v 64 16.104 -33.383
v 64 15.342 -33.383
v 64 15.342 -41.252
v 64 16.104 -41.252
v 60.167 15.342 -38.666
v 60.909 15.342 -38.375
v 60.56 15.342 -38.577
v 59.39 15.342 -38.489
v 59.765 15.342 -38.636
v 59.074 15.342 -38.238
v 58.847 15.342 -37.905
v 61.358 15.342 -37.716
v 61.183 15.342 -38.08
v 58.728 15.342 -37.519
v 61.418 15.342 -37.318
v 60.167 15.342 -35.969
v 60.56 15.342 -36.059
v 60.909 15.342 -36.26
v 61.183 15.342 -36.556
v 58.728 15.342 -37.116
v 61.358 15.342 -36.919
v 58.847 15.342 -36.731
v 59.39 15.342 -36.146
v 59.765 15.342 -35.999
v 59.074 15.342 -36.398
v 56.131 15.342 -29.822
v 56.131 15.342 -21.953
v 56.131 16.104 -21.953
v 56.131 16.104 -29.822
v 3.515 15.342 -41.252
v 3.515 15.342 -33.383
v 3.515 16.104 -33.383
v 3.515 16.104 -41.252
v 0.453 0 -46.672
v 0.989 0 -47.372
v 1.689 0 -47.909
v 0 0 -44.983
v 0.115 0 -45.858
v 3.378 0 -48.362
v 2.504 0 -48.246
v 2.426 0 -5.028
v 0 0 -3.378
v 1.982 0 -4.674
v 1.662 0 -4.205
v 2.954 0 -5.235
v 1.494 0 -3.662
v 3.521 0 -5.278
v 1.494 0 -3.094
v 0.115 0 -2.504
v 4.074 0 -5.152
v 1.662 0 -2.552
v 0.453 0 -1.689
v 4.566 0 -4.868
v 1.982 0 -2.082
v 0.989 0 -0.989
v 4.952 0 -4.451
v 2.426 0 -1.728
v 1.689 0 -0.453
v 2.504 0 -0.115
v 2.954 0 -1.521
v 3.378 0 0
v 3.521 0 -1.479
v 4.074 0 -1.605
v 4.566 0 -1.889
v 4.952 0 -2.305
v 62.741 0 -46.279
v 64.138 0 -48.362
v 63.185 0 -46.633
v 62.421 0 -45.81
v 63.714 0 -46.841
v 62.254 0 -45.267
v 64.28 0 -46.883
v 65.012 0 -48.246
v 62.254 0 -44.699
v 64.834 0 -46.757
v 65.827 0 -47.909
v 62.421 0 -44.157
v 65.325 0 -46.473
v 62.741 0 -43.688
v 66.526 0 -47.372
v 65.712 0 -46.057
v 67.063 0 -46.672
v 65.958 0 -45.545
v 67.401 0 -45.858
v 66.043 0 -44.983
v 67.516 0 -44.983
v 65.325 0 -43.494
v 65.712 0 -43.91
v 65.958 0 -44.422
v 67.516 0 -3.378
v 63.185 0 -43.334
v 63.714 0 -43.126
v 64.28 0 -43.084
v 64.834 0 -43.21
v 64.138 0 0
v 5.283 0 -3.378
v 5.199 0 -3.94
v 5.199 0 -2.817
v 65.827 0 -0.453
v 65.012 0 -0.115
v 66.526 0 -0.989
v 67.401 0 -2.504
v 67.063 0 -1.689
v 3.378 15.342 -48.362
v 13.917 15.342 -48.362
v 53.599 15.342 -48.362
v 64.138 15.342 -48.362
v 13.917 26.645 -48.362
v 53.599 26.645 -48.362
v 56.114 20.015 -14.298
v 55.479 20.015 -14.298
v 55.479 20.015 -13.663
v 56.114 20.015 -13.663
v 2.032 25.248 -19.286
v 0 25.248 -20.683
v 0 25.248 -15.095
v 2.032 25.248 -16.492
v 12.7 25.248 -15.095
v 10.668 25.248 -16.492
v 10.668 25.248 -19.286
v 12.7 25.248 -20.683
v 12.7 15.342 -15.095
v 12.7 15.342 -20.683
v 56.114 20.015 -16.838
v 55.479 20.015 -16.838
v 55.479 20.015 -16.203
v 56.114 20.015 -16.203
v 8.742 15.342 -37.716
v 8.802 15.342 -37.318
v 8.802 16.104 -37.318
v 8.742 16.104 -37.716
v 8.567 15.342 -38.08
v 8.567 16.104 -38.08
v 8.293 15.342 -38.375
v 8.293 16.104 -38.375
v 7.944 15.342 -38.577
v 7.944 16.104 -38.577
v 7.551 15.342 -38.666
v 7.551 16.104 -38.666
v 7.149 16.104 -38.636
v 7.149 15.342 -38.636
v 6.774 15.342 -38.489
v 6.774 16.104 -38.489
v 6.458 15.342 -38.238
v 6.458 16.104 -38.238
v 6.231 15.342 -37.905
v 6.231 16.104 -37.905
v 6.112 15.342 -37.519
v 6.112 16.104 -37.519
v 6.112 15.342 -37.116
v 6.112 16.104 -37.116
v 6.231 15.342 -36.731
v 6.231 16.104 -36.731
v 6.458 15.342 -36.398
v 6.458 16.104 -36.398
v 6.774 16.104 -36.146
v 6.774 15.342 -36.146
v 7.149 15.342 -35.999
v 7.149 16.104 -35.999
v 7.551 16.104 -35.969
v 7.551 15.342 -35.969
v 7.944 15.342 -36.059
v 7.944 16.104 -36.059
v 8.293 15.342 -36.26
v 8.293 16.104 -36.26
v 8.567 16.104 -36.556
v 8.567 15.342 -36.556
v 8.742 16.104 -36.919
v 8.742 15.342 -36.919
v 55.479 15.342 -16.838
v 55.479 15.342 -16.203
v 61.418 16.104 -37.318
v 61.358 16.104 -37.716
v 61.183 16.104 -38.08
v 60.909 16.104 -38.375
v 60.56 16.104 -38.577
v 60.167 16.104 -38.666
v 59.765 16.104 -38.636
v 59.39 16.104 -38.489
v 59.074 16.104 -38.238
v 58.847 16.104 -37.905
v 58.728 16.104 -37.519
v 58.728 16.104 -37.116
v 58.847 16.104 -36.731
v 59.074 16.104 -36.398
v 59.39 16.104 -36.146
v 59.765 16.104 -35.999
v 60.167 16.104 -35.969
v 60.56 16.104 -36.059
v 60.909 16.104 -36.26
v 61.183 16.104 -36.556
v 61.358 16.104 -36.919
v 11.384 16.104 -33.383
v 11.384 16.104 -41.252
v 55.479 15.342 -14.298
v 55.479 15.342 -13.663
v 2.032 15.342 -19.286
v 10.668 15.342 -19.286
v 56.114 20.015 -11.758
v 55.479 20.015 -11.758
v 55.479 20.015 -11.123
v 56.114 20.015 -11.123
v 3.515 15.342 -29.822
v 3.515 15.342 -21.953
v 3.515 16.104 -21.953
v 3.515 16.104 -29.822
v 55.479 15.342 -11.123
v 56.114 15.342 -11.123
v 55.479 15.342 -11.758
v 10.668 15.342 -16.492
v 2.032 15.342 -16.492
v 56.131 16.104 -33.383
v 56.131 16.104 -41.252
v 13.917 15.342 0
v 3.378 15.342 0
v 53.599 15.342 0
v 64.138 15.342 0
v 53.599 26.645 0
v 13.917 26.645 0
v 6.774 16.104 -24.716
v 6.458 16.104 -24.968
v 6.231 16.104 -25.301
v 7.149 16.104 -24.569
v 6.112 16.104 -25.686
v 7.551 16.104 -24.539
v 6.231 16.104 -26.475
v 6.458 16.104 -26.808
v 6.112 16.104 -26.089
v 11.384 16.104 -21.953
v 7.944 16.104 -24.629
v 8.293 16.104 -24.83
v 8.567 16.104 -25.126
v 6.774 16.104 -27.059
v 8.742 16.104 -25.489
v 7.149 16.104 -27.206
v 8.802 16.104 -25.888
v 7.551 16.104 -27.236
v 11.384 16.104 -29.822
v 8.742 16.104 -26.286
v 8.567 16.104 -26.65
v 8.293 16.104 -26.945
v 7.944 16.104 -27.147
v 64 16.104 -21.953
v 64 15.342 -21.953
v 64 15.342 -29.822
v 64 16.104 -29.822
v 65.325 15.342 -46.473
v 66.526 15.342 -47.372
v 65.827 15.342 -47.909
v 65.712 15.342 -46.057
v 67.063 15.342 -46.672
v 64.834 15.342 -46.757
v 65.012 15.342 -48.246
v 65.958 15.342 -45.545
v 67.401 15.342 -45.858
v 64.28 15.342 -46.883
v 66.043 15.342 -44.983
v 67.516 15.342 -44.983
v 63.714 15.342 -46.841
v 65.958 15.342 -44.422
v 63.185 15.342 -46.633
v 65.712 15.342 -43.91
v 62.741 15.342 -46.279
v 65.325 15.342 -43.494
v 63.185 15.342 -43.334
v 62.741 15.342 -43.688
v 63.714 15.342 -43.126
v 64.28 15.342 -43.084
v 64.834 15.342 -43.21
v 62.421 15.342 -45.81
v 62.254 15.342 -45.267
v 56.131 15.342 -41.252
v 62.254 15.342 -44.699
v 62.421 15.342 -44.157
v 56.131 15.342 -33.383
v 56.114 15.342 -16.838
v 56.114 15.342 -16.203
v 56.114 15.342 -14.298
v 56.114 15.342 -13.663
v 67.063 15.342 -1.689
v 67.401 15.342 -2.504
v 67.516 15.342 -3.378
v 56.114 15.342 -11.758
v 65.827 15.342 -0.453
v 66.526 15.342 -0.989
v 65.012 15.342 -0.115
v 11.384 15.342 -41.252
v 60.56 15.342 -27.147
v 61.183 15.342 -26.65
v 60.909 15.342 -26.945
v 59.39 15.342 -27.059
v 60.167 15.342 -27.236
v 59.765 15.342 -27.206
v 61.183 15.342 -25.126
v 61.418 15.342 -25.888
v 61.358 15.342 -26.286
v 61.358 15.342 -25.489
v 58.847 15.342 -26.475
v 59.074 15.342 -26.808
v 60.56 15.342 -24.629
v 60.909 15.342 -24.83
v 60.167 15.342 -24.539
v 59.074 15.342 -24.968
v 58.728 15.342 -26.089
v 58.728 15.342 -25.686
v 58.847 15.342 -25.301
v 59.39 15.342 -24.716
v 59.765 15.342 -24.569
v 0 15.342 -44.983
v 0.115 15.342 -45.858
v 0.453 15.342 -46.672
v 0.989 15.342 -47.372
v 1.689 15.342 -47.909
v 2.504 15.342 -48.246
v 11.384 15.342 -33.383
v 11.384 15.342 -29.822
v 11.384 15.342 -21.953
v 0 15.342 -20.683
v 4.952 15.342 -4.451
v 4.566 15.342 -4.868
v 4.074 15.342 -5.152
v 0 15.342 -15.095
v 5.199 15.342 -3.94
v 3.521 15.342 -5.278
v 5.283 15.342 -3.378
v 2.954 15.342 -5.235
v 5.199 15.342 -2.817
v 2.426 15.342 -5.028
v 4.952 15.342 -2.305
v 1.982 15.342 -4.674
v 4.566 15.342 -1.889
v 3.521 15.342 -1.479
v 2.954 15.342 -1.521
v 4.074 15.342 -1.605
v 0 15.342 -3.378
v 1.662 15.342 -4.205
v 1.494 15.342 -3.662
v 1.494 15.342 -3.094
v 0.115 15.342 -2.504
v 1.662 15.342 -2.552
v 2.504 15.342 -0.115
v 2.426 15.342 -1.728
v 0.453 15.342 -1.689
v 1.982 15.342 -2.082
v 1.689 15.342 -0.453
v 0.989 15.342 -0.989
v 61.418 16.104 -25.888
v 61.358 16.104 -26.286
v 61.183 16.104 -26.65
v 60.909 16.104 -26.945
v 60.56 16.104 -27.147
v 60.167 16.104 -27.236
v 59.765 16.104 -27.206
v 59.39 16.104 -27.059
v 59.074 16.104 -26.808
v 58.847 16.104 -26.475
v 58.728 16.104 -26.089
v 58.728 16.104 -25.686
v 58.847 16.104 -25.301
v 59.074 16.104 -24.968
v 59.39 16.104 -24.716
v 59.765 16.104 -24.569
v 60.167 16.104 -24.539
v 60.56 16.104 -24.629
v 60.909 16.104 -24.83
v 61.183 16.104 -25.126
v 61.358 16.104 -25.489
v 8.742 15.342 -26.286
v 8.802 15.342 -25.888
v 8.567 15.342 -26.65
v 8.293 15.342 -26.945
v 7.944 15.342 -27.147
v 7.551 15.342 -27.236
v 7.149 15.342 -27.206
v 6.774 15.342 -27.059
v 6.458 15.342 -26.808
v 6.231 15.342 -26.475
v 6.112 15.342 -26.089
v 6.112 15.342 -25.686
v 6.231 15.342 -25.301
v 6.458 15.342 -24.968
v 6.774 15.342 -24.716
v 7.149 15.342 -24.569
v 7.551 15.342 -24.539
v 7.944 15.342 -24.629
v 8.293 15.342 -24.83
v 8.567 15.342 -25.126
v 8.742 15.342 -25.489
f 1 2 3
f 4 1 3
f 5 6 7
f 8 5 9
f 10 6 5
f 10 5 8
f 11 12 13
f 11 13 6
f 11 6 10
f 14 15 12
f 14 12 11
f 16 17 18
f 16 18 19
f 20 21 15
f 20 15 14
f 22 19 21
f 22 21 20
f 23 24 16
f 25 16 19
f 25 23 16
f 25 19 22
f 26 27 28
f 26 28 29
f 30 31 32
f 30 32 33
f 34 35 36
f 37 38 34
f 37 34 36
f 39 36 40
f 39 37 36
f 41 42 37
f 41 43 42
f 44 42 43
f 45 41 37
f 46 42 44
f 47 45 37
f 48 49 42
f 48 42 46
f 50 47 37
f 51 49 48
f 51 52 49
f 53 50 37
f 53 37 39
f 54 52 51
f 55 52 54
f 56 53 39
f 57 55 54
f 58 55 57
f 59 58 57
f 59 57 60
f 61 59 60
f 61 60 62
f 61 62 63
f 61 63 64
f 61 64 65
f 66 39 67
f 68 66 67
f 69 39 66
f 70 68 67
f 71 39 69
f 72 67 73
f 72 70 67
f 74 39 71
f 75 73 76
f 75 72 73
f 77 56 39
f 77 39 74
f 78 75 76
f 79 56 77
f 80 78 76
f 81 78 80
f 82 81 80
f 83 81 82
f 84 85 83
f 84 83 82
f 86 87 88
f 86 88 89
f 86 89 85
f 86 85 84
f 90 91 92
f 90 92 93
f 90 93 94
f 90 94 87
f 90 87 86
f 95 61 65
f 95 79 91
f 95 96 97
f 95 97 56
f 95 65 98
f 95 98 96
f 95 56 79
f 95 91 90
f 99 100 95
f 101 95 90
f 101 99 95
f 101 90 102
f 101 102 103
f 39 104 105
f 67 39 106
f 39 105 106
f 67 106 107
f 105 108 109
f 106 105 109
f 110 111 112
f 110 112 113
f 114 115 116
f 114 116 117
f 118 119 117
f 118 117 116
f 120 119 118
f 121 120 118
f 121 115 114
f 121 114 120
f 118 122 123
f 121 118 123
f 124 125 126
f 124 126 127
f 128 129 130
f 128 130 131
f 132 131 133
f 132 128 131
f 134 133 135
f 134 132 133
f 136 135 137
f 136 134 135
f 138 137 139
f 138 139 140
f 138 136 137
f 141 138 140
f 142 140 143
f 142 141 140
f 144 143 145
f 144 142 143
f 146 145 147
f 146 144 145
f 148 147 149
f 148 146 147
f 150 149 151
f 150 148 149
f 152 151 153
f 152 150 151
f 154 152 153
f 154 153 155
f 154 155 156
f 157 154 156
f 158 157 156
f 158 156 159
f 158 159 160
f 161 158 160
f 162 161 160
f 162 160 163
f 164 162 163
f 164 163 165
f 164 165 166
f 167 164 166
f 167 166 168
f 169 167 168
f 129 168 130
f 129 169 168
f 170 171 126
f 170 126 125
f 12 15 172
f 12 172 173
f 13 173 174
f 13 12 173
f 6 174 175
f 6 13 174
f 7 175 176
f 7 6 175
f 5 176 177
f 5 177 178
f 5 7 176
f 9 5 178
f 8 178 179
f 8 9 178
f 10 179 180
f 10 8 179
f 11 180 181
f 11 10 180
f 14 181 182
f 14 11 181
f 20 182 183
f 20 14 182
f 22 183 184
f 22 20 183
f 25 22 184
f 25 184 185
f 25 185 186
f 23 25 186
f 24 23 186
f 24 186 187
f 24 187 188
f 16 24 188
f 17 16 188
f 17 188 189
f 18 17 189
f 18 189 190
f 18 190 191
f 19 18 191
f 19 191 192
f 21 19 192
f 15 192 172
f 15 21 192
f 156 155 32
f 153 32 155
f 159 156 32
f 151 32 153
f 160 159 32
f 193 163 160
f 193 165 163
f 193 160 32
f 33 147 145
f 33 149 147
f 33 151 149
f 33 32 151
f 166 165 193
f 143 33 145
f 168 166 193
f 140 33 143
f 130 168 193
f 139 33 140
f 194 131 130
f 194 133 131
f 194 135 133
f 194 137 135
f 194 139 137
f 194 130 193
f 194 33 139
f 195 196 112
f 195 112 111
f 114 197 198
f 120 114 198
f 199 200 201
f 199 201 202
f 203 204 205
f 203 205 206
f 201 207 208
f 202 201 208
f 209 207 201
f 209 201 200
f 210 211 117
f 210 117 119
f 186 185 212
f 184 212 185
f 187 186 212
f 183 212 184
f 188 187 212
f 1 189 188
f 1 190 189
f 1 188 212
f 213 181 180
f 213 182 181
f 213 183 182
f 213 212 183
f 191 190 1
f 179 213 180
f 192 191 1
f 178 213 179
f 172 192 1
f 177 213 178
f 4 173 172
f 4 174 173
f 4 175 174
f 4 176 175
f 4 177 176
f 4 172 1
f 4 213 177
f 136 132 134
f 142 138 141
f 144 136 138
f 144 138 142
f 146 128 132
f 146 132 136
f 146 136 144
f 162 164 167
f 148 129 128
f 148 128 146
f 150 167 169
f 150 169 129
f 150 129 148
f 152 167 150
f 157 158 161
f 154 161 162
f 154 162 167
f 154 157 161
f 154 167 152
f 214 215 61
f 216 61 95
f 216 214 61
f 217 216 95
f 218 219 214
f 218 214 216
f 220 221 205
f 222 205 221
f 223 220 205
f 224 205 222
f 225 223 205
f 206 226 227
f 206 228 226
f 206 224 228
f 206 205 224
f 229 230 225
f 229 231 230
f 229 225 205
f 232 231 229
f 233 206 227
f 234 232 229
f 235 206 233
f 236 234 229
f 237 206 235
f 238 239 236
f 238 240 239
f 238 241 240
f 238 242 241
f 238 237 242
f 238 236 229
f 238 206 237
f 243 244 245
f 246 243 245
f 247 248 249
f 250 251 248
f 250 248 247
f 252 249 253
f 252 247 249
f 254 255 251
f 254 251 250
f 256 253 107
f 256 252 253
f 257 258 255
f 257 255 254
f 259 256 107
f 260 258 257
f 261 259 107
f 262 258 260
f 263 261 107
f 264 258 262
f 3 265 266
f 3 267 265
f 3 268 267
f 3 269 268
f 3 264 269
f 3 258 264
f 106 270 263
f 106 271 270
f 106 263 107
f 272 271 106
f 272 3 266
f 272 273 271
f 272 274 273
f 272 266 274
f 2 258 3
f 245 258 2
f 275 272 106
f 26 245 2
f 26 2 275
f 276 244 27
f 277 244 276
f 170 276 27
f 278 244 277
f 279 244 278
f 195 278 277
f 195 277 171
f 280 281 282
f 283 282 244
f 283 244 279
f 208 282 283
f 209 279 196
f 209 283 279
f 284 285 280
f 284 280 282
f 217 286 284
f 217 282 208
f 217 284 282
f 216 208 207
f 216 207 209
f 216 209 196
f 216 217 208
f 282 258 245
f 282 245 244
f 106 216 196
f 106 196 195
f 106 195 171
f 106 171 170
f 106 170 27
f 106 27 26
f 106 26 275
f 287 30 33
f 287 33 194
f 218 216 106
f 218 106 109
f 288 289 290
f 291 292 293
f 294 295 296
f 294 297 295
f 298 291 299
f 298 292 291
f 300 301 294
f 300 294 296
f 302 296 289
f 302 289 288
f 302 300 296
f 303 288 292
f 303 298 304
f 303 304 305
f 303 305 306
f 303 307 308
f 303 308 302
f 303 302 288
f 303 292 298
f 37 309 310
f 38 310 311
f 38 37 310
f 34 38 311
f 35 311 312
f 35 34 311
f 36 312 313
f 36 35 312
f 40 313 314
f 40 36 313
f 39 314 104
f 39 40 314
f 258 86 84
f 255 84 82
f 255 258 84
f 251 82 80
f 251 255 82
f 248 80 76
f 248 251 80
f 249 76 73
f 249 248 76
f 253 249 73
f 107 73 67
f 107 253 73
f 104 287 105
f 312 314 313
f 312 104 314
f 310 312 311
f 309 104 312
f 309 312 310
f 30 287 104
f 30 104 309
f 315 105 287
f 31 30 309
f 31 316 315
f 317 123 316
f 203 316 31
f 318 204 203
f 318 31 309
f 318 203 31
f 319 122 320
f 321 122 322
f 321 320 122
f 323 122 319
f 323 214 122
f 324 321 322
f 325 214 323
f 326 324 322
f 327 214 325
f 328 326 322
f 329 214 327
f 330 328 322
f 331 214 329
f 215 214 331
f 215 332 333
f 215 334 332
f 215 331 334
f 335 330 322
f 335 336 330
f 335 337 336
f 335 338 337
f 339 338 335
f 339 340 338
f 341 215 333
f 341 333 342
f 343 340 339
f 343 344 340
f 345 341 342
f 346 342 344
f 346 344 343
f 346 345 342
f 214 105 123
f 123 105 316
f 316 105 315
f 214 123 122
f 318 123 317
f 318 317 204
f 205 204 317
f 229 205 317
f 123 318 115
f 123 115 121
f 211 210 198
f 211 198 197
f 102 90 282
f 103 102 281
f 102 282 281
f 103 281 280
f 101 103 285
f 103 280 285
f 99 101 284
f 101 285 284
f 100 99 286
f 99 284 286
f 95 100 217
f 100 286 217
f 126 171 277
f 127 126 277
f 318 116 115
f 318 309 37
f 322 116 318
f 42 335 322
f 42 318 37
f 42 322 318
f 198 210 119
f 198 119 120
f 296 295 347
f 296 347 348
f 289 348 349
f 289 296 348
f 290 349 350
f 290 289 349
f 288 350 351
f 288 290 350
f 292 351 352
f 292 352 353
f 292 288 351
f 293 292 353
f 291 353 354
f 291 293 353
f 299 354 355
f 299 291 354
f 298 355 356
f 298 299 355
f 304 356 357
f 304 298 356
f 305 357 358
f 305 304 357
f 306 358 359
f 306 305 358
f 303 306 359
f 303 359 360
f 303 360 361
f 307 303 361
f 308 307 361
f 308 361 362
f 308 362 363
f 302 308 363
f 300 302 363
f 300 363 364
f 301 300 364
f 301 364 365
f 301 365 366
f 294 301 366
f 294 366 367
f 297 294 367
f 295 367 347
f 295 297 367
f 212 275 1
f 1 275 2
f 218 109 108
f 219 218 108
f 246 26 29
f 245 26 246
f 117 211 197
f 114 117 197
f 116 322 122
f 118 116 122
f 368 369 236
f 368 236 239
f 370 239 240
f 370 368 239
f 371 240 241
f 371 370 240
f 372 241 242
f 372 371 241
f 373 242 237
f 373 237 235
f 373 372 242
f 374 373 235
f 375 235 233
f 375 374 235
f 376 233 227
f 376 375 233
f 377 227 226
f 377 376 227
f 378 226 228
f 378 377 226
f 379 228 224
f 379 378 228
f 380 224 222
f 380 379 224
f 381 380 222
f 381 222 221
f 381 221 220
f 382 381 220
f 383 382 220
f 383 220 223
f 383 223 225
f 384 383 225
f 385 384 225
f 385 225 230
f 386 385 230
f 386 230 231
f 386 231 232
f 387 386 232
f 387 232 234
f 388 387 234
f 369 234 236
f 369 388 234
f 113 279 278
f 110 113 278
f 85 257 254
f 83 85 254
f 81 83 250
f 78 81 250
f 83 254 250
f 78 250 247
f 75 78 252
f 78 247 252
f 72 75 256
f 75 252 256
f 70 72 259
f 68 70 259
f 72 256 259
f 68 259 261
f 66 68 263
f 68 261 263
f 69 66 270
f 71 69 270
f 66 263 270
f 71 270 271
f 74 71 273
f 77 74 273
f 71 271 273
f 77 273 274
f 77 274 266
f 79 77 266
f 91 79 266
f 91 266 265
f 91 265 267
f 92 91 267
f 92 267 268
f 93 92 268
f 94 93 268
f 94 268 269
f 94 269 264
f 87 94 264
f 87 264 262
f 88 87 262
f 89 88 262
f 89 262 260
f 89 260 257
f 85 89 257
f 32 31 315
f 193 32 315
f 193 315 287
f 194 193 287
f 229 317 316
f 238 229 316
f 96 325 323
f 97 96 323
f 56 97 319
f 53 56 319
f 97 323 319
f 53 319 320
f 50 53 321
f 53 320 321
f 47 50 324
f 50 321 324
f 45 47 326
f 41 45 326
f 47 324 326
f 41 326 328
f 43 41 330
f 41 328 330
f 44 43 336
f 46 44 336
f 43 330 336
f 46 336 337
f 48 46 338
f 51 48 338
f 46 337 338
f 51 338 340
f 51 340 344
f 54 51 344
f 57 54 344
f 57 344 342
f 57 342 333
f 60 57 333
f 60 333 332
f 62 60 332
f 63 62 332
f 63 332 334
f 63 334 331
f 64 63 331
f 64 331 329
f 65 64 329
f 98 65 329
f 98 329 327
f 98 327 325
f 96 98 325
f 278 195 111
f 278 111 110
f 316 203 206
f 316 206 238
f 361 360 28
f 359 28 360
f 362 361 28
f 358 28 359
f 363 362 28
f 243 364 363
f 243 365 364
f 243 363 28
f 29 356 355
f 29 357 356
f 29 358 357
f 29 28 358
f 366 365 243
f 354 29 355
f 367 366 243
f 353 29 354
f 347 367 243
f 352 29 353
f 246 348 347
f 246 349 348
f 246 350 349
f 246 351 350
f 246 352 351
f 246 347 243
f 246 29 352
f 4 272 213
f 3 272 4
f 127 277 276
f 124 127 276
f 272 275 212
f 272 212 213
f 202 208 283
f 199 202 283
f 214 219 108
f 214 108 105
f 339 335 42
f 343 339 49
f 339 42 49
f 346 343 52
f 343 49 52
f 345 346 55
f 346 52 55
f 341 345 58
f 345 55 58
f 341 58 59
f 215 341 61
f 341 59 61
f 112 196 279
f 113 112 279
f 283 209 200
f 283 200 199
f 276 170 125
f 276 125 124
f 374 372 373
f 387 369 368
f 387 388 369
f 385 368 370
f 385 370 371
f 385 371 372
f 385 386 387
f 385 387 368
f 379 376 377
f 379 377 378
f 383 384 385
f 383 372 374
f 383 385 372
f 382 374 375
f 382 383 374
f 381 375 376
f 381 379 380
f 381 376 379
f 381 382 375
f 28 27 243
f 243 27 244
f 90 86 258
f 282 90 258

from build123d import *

# Parameters (mm, degrees)
BOSS_EXTRUDE1_DEPTH = 48.3616
FILLET1_R           = 3.3782
SKETCH2_R           = 1.905
CUT_EXTRUDE1_DEPTH  = 85.454628013
SKETCH3_W           = 7.86892
SKETCH3_H           = 7.86892
SKETCH3_R           = 1.35255
BOSS_EXTRUDE2_DEPTH = 0.762
SKETCH4_W           = 12.7
SKETCH4_H           = 5.588
SKETCH4_W_2         = 8.636
SKETCH4_H_2         = 2.794
BOSS_EXTRUDE3_DEPTH = 9.906
SKETCH5_W           = 0.635
SKETCH5_H           = 0.635
BOSS_EXTRUDE4_DEPTH = 4.6736


with BuildPart() as part:
    # Sketch1 → Boss-Extrude1 (new body)
    with BuildSketch(Plane.XY):
        Polygon((0, 0), (67.51574, 0), (67.51574, 15.3416), (53.59908, 15.3416), (53.59908, 26.6446), (13.91666, 26.6446), (13.91666, 15.3416), (0, 15.3416), align=None)
    extrude(amount=-BOSS_EXTRUDE1_DEPTH)

    # Fillet1
    fillet1_edges = [part.edges().sort_by_distance(p)[0] for p in [
        (0, 7.6708, -48.3616),
        (67.51574, 7.6708, -48.3616),
        (67.51574, 7.6708, 0),
        (0, 7.6708, 0),
    ]]
    fillet(fillet1_edges, radius=FILLET1_R)

    # Sketch2 → Cut-Extrude1 (cut, through all)
    with BuildSketch(Plane(origin=(0, 15.3416, 0), x_dir=(1, 0, 0), z_dir=(0, 1, 0))):
        with Locations((3.3782, 3.3782)):
            Circle(SKETCH2_R)
        with Locations((64.13754, 44.9834)):
            Circle(SKETCH2_R)
    extrude(amount=-CUT_EXTRUDE1_DEPTH, mode=Mode.SUBTRACT)

    # Sketch3 → Boss-Extrude2 (add)
    # profile 1 of 4: a face of its own
    with BuildSketch(Plane(origin=(0, 15.3416, 0), x_dir=(1, 0, 0), z_dir=(0, 1, 0))):
        with Locations((60.06592, 25.88768)):
            Rectangle(SKETCH3_W, SKETCH3_H)
        with Locations((60.06592, 25.88768)):
            Circle(SKETCH3_R, mode=Mode.SUBTRACT)
    # profile 2 of 4: a face of its own
    with BuildSketch(Plane(origin=(0, 15.3416, 0), x_dir=(1, 0, 0), z_dir=(0, 1, 0))):
        with Locations((7.44982, 37.31768)):
            Rectangle(SKETCH3_W, SKETCH3_H)
        with Locations((7.44982, 37.31768)):
            Circle(SKETCH3_R, mode=Mode.SUBTRACT)
    # profile 3 of 4: a face of its own
    with BuildSketch(Plane(origin=(0, 15.3416, 0), x_dir=(1, 0, 0), z_dir=(0, 1, 0))):
        with Locations((7.44982, 25.88768)):
            Rectangle(SKETCH3_W, SKETCH3_H)
        with Locations((7.44982, 25.88768)):
            Circle(SKETCH3_R, mode=Mode.SUBTRACT)
    # profile 4 of 4: a face of its own
    with BuildSketch(Plane(origin=(0, 15.3416, 0), x_dir=(1, 0, 0), z_dir=(0, 1, 0))):
        with Locations((60.06592, 37.31768)):
            Rectangle(SKETCH3_W, SKETCH3_H)
        with Locations((60.06592, 37.31768)):
            Circle(SKETCH3_R, mode=Mode.SUBTRACT)
    extrude(amount=BOSS_EXTRUDE2_DEPTH)

    # Sketch4 → Boss-Extrude3 (add)
    with BuildSketch(Plane(origin=(0, 15.3416, 0), x_dir=(1, 0, 0), z_dir=(0, 1, 0))):
        with Locations((6.35, 17.88922)):
            Rectangle(SKETCH4_W, SKETCH4_H)
        with Locations((6.35, 17.88922)):
            Rectangle(SKETCH4_W_2, SKETCH4_H_2, mode=Mode.SUBTRACT)
    extrude(amount=BOSS_EXTRUDE3_DEPTH)

    # Sketch5 → Boss-Extrude4 (add)
    with BuildSketch(Plane(origin=(0, 15.3416, 0), x_dir=(1, 0, 0), z_dir=(0, 1, 0))):
        with Locations((55.79618, 16.52016)):
            Rectangle(SKETCH5_W, SKETCH5_H)
        with Locations((55.79618, 13.98016)):
            Rectangle(SKETCH5_W, SKETCH5_H)
        with Locations((55.79618, 11.44016)):
            Rectangle(SKETCH5_W, SKETCH5_H)
    extrude(amount=BOSS_EXTRUDE4_DEPTH)


solid = part.part
